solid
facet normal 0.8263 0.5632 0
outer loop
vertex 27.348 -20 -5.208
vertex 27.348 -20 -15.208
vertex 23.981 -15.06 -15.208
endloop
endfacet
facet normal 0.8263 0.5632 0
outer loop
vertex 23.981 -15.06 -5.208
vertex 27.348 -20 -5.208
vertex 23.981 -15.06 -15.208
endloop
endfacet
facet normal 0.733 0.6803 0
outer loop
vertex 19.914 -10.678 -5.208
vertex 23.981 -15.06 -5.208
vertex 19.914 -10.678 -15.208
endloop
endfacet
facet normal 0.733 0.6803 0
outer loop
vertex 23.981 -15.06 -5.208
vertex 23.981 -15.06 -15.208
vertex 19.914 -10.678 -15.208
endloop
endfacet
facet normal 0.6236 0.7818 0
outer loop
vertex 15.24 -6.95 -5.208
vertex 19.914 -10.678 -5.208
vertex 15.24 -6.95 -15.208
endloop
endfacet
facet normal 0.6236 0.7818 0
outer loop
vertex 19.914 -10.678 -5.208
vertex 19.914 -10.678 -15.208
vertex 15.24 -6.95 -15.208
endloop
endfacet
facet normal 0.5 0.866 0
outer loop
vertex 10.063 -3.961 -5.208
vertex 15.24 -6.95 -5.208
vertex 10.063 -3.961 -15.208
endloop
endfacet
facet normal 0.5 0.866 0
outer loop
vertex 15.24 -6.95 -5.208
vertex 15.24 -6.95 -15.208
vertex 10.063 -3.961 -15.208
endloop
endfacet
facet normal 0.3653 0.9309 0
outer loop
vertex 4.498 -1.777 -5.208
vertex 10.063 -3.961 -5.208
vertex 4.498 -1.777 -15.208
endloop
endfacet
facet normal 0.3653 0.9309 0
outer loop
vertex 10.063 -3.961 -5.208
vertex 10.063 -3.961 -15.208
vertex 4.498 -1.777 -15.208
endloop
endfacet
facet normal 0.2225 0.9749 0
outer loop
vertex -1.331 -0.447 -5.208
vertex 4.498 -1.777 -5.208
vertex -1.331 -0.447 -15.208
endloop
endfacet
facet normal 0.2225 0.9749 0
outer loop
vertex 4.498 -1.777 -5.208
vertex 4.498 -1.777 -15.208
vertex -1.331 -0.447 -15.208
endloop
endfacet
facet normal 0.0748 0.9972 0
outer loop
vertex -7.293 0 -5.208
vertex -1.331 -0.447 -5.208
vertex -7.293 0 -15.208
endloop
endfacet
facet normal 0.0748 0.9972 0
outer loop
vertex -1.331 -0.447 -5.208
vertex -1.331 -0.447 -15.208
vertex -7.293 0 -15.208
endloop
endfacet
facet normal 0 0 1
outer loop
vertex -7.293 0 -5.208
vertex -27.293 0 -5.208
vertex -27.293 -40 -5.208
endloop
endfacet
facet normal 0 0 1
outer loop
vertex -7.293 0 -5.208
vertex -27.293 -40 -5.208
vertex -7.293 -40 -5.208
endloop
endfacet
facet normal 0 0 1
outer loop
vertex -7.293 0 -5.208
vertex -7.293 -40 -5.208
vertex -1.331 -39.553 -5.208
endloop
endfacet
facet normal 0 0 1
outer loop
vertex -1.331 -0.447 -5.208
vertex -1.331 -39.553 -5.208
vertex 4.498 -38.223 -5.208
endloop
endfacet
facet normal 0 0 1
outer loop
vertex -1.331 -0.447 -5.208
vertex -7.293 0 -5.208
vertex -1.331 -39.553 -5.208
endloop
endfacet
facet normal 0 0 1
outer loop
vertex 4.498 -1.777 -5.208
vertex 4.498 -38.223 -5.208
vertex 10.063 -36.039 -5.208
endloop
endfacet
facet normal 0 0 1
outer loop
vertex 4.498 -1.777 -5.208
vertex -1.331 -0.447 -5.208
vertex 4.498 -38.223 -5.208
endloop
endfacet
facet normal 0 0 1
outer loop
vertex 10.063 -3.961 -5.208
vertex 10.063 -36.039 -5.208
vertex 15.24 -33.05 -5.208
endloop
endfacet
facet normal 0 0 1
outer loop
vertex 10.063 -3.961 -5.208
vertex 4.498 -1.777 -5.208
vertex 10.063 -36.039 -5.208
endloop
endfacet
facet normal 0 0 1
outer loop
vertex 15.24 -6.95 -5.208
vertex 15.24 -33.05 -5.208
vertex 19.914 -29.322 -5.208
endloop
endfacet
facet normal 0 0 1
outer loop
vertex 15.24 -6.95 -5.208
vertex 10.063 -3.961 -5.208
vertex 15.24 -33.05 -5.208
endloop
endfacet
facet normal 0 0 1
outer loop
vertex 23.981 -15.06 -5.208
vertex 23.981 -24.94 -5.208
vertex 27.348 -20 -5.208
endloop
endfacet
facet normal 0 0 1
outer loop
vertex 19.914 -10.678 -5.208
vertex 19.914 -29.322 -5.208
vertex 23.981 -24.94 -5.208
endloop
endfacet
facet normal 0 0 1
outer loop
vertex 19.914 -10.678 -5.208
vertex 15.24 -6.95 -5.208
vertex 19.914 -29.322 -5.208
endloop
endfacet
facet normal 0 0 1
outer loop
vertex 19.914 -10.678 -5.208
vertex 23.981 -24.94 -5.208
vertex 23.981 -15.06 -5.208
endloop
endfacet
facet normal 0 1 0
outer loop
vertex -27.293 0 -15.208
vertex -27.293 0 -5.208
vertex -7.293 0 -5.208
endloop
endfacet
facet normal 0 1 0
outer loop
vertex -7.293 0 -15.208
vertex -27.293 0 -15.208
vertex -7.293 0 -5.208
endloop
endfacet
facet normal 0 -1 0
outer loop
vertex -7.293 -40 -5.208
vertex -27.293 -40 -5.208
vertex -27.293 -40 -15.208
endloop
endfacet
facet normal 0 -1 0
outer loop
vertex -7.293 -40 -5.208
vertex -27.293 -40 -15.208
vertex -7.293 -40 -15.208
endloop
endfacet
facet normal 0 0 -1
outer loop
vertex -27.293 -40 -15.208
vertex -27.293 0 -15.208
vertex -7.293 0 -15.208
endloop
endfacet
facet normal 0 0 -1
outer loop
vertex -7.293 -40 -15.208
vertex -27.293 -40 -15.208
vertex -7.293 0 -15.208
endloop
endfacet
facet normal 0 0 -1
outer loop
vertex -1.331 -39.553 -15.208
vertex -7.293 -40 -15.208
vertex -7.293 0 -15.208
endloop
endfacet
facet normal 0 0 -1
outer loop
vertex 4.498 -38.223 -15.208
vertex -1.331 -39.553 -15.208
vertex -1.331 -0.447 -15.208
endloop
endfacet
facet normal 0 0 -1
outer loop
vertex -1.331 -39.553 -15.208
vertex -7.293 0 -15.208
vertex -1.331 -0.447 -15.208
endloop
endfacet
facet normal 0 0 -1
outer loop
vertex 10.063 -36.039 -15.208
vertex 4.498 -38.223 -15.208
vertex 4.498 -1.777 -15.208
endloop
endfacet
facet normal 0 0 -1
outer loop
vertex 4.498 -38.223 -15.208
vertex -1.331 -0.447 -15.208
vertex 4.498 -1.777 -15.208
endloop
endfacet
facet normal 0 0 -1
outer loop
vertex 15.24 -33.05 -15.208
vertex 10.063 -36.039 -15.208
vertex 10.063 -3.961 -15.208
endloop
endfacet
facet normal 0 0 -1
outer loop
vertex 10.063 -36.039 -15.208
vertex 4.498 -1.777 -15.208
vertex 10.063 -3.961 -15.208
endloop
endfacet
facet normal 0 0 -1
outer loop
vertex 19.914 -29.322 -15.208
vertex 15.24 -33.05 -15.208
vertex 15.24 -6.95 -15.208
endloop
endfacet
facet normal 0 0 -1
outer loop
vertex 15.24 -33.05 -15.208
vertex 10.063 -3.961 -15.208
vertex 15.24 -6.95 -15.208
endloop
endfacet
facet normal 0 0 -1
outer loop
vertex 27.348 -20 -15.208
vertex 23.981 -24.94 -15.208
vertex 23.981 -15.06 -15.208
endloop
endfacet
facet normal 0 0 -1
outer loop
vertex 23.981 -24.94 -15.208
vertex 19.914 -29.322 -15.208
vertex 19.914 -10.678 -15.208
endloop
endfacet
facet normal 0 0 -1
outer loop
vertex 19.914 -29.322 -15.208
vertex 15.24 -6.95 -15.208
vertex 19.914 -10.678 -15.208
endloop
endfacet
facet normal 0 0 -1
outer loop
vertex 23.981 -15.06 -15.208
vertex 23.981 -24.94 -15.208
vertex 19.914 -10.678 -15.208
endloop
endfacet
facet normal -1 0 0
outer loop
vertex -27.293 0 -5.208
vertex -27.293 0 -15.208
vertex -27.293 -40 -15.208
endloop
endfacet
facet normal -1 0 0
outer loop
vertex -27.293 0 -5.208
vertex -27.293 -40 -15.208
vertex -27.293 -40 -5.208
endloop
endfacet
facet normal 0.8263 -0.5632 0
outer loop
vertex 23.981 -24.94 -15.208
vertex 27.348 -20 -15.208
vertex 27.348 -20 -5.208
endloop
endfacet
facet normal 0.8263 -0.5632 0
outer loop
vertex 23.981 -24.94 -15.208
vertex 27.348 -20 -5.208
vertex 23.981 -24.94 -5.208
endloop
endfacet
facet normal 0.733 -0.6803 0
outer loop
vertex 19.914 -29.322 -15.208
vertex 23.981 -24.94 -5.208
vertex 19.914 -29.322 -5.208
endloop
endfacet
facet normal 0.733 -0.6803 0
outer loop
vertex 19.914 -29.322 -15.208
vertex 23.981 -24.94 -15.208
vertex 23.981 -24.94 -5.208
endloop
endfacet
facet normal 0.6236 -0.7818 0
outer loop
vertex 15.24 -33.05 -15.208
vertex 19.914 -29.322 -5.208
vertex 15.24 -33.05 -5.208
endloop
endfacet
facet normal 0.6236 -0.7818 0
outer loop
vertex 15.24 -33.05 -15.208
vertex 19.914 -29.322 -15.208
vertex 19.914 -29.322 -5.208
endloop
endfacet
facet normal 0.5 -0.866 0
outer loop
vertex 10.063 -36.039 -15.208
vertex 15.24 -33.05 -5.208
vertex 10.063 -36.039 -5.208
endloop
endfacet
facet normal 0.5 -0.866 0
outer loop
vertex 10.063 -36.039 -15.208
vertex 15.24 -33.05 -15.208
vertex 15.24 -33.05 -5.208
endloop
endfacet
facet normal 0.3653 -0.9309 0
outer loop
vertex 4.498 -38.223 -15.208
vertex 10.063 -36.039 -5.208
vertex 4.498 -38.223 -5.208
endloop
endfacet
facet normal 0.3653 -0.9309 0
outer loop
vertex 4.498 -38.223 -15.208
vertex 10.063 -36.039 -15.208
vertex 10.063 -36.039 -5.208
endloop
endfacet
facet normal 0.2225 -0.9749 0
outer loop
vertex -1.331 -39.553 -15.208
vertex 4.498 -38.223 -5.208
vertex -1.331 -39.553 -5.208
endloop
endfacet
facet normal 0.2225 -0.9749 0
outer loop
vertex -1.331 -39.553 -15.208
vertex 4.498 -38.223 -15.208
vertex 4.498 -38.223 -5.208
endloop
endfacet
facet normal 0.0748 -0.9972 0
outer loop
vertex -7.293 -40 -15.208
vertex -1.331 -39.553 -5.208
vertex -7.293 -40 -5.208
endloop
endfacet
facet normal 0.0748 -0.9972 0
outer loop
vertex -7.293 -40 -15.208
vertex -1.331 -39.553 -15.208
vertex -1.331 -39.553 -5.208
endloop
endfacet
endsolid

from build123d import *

# Parameters (mm, degrees)
F0_W        = 60
F0_H        = 10
F1_DEPTH    = 40
F2_T1_DEPTH = 210


# Not quite as in the source:
# - a fillet or chamfer that OpenCascade refuses, or shapes differently, is made with other operations: its cross-section is extruded or revolved along the edge and cut away or added


with BuildPart() as f1:
    # F0 (on Front) → F1 (new body)
    with BuildSketch(Plane.XZ):
        with Locations((2.7074571699, -10.2079533711)):
            Rectangle(F0_W, F0_H)
    extrude(amount=F1_DEPTH)

    # F2: fillet of radius 40 on 2 edges, made by hand

    # F2_s2 → F2_t1 (cut)
    with BuildSketch(Plane.XY.offset(-115.2079533711)):
        with BuildLine():
            ThreePointArc((32.7074571699, 0), (20.9917284174, -28.2842712475), (-7.2925428301, -40))
            Line((-7.2925428301, -40), (32.7074571699, -40))
            Line((32.7074571699, -40), (32.7074571699, 0))
        make_face()
        with BuildLine():
            ThreePointArc((32.7074571699, -40), (20.9917284174, -11.7157287525), (-7.2925428301, 0))
            Line((-7.2925428301, 0), (32.7074571699, 0))
            Line((32.7074571699, 0), (32.7074571699, -40))
        make_face()
    extrude(amount=F2_T1_DEPTH, mode=Mode.SUBTRACT)


solid = f1.part
